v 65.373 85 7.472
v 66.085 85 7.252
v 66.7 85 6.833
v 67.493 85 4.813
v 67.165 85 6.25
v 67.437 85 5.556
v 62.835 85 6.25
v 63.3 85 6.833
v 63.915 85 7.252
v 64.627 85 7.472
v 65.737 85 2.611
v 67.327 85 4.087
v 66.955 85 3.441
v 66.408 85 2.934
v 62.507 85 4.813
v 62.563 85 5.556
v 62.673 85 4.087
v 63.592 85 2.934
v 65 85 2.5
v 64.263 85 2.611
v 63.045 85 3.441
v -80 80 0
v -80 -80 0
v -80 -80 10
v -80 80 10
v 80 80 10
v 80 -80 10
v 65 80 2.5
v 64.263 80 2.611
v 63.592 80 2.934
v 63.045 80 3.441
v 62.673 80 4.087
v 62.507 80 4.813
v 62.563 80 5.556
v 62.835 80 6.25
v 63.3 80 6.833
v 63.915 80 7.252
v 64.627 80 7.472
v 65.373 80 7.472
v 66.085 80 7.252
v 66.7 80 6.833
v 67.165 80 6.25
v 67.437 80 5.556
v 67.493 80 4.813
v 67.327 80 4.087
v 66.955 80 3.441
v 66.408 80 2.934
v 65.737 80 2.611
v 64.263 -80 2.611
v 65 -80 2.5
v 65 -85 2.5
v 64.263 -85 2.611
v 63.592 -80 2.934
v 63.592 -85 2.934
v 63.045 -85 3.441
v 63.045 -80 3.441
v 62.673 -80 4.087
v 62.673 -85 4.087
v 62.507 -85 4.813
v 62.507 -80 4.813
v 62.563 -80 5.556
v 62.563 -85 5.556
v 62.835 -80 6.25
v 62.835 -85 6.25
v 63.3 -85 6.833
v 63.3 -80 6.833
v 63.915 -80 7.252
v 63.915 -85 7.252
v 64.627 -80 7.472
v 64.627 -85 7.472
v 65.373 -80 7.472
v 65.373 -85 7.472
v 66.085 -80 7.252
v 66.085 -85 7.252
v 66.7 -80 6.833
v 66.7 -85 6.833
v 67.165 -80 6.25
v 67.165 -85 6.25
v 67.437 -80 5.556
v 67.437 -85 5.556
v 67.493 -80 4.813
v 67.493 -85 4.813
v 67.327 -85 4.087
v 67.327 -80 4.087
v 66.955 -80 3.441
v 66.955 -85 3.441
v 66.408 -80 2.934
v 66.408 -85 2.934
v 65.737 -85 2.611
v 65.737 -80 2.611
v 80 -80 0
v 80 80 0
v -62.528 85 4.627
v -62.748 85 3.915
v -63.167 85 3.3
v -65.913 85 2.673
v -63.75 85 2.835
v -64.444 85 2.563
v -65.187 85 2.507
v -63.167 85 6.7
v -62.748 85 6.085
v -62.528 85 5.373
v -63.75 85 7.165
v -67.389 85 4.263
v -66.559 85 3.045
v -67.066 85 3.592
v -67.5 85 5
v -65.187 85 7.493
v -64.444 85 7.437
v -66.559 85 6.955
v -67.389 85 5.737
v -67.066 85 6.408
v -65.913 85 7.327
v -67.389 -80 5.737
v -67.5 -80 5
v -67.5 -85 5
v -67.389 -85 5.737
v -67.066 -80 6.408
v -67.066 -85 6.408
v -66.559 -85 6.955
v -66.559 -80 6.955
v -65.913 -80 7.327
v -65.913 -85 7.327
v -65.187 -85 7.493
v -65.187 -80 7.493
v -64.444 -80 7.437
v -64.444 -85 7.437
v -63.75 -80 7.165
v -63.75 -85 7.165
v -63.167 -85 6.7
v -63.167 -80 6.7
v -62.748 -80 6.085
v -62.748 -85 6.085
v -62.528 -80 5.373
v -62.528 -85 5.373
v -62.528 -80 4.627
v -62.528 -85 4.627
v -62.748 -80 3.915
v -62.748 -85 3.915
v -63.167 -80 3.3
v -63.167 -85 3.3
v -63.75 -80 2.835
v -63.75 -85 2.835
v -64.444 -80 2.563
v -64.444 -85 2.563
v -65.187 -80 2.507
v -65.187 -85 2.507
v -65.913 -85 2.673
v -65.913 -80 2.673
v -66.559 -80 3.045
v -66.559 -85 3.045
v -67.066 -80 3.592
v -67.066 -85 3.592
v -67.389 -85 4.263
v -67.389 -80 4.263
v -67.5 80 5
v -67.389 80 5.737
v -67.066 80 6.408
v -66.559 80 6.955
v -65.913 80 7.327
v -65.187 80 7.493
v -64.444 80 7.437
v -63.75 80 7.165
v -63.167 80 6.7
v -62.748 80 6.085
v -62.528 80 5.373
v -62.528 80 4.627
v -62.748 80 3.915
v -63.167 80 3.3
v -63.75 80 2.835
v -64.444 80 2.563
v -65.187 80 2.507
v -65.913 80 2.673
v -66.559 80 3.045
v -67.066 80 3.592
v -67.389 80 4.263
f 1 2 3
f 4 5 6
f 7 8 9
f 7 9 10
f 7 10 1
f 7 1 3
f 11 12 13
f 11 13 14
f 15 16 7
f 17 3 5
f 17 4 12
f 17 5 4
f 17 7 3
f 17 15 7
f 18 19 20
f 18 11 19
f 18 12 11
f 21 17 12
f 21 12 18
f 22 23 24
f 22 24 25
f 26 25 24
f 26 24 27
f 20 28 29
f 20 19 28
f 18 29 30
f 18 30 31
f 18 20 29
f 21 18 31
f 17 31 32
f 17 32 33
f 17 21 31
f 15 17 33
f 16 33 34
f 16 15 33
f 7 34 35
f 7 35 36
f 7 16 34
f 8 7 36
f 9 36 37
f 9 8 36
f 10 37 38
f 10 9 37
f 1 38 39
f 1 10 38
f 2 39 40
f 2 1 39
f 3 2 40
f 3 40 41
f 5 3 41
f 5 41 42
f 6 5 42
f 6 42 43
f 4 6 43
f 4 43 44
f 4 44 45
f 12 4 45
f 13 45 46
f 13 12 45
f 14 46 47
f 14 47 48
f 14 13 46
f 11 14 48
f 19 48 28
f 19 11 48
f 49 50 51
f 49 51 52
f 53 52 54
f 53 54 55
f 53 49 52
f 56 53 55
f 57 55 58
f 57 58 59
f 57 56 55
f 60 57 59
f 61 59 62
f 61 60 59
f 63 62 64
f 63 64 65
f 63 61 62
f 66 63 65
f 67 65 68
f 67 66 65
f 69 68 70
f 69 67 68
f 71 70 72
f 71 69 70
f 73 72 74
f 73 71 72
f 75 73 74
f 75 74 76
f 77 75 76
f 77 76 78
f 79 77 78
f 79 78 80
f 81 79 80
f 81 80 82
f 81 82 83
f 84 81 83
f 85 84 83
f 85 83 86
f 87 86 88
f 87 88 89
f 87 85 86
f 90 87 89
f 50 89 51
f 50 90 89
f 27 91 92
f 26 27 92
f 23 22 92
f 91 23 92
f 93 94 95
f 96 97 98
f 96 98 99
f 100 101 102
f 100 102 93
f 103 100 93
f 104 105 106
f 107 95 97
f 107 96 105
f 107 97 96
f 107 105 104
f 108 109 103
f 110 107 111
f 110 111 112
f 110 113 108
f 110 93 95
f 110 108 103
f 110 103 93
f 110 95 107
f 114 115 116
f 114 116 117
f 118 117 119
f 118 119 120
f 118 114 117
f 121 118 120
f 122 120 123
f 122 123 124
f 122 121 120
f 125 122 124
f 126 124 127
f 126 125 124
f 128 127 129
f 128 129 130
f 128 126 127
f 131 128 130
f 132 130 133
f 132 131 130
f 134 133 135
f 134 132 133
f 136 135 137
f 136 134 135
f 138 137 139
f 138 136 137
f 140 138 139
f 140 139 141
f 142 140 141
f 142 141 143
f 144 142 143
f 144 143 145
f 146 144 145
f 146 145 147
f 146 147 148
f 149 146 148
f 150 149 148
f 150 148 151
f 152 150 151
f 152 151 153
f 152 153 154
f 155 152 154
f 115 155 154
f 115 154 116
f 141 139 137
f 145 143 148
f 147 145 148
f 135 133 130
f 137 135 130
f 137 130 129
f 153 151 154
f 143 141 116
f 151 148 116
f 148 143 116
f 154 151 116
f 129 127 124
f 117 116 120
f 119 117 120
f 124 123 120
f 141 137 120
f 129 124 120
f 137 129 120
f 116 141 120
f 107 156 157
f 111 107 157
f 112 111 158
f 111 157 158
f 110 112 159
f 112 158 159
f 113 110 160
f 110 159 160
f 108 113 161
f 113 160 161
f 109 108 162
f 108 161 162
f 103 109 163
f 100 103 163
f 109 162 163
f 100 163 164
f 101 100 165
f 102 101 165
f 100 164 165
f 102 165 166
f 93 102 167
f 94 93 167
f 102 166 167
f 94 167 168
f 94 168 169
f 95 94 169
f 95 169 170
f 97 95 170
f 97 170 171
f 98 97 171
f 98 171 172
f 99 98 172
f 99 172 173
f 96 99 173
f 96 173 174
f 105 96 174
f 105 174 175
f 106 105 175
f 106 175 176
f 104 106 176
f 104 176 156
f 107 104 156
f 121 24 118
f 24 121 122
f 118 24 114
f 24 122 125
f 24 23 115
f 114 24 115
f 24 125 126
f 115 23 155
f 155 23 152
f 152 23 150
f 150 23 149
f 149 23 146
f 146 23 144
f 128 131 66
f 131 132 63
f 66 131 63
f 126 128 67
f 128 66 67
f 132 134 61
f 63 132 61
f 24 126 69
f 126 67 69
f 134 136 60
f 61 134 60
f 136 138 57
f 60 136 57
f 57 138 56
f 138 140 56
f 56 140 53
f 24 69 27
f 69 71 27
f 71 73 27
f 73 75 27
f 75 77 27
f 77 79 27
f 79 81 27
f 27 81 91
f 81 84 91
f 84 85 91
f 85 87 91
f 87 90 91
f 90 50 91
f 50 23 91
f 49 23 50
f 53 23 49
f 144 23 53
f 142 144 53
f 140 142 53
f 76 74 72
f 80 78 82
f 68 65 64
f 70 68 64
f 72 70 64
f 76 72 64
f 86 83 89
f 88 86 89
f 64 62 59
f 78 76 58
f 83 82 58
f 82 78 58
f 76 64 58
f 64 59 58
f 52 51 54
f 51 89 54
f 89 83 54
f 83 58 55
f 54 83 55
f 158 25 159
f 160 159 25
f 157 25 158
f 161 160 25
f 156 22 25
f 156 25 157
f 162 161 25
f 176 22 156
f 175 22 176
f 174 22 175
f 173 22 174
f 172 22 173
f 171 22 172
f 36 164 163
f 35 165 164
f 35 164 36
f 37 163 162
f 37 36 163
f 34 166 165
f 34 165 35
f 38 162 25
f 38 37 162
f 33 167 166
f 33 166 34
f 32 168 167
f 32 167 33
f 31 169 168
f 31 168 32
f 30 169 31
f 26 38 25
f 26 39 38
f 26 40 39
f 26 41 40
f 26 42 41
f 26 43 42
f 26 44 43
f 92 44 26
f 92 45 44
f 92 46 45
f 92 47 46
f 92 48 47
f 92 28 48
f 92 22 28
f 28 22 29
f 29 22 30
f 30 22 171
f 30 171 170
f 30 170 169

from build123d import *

# Parameters (mm, degrees)
SKETCH_2_W      = 160
SKETCH_2_H      = 160
EXTRUDE_1_DEPTH = 10
SKETCH_4_R      = 2.5
EXTRUDE_2_DEPTH = 85


with BuildPart() as part:
    # 草图2 → 凸台-拉伸1 (new body)
    with BuildSketch(Plane.XY):
        Rectangle(SKETCH_2_W, SKETCH_2_H)
    extrude(amount=EXTRUDE_1_DEPTH)

    # 草图4 → 凸台-拉伸2 (add, symmetric)
    with BuildSketch(Plane(origin=(0, 0, 0), x_dir=(1, 0, 0), z_dir=(0, 1, 0))):
        with Locations(Location((-65, -5, 0), (0, 0, 180))):
            Circle(SKETCH_4_R)
        with Locations(Location((65, -5, 0), (0, 0, 90))):
            Circle(SKETCH_4_R)
    extrude(amount=EXTRUDE_2_DEPTH, both=True)


solid = part.part
